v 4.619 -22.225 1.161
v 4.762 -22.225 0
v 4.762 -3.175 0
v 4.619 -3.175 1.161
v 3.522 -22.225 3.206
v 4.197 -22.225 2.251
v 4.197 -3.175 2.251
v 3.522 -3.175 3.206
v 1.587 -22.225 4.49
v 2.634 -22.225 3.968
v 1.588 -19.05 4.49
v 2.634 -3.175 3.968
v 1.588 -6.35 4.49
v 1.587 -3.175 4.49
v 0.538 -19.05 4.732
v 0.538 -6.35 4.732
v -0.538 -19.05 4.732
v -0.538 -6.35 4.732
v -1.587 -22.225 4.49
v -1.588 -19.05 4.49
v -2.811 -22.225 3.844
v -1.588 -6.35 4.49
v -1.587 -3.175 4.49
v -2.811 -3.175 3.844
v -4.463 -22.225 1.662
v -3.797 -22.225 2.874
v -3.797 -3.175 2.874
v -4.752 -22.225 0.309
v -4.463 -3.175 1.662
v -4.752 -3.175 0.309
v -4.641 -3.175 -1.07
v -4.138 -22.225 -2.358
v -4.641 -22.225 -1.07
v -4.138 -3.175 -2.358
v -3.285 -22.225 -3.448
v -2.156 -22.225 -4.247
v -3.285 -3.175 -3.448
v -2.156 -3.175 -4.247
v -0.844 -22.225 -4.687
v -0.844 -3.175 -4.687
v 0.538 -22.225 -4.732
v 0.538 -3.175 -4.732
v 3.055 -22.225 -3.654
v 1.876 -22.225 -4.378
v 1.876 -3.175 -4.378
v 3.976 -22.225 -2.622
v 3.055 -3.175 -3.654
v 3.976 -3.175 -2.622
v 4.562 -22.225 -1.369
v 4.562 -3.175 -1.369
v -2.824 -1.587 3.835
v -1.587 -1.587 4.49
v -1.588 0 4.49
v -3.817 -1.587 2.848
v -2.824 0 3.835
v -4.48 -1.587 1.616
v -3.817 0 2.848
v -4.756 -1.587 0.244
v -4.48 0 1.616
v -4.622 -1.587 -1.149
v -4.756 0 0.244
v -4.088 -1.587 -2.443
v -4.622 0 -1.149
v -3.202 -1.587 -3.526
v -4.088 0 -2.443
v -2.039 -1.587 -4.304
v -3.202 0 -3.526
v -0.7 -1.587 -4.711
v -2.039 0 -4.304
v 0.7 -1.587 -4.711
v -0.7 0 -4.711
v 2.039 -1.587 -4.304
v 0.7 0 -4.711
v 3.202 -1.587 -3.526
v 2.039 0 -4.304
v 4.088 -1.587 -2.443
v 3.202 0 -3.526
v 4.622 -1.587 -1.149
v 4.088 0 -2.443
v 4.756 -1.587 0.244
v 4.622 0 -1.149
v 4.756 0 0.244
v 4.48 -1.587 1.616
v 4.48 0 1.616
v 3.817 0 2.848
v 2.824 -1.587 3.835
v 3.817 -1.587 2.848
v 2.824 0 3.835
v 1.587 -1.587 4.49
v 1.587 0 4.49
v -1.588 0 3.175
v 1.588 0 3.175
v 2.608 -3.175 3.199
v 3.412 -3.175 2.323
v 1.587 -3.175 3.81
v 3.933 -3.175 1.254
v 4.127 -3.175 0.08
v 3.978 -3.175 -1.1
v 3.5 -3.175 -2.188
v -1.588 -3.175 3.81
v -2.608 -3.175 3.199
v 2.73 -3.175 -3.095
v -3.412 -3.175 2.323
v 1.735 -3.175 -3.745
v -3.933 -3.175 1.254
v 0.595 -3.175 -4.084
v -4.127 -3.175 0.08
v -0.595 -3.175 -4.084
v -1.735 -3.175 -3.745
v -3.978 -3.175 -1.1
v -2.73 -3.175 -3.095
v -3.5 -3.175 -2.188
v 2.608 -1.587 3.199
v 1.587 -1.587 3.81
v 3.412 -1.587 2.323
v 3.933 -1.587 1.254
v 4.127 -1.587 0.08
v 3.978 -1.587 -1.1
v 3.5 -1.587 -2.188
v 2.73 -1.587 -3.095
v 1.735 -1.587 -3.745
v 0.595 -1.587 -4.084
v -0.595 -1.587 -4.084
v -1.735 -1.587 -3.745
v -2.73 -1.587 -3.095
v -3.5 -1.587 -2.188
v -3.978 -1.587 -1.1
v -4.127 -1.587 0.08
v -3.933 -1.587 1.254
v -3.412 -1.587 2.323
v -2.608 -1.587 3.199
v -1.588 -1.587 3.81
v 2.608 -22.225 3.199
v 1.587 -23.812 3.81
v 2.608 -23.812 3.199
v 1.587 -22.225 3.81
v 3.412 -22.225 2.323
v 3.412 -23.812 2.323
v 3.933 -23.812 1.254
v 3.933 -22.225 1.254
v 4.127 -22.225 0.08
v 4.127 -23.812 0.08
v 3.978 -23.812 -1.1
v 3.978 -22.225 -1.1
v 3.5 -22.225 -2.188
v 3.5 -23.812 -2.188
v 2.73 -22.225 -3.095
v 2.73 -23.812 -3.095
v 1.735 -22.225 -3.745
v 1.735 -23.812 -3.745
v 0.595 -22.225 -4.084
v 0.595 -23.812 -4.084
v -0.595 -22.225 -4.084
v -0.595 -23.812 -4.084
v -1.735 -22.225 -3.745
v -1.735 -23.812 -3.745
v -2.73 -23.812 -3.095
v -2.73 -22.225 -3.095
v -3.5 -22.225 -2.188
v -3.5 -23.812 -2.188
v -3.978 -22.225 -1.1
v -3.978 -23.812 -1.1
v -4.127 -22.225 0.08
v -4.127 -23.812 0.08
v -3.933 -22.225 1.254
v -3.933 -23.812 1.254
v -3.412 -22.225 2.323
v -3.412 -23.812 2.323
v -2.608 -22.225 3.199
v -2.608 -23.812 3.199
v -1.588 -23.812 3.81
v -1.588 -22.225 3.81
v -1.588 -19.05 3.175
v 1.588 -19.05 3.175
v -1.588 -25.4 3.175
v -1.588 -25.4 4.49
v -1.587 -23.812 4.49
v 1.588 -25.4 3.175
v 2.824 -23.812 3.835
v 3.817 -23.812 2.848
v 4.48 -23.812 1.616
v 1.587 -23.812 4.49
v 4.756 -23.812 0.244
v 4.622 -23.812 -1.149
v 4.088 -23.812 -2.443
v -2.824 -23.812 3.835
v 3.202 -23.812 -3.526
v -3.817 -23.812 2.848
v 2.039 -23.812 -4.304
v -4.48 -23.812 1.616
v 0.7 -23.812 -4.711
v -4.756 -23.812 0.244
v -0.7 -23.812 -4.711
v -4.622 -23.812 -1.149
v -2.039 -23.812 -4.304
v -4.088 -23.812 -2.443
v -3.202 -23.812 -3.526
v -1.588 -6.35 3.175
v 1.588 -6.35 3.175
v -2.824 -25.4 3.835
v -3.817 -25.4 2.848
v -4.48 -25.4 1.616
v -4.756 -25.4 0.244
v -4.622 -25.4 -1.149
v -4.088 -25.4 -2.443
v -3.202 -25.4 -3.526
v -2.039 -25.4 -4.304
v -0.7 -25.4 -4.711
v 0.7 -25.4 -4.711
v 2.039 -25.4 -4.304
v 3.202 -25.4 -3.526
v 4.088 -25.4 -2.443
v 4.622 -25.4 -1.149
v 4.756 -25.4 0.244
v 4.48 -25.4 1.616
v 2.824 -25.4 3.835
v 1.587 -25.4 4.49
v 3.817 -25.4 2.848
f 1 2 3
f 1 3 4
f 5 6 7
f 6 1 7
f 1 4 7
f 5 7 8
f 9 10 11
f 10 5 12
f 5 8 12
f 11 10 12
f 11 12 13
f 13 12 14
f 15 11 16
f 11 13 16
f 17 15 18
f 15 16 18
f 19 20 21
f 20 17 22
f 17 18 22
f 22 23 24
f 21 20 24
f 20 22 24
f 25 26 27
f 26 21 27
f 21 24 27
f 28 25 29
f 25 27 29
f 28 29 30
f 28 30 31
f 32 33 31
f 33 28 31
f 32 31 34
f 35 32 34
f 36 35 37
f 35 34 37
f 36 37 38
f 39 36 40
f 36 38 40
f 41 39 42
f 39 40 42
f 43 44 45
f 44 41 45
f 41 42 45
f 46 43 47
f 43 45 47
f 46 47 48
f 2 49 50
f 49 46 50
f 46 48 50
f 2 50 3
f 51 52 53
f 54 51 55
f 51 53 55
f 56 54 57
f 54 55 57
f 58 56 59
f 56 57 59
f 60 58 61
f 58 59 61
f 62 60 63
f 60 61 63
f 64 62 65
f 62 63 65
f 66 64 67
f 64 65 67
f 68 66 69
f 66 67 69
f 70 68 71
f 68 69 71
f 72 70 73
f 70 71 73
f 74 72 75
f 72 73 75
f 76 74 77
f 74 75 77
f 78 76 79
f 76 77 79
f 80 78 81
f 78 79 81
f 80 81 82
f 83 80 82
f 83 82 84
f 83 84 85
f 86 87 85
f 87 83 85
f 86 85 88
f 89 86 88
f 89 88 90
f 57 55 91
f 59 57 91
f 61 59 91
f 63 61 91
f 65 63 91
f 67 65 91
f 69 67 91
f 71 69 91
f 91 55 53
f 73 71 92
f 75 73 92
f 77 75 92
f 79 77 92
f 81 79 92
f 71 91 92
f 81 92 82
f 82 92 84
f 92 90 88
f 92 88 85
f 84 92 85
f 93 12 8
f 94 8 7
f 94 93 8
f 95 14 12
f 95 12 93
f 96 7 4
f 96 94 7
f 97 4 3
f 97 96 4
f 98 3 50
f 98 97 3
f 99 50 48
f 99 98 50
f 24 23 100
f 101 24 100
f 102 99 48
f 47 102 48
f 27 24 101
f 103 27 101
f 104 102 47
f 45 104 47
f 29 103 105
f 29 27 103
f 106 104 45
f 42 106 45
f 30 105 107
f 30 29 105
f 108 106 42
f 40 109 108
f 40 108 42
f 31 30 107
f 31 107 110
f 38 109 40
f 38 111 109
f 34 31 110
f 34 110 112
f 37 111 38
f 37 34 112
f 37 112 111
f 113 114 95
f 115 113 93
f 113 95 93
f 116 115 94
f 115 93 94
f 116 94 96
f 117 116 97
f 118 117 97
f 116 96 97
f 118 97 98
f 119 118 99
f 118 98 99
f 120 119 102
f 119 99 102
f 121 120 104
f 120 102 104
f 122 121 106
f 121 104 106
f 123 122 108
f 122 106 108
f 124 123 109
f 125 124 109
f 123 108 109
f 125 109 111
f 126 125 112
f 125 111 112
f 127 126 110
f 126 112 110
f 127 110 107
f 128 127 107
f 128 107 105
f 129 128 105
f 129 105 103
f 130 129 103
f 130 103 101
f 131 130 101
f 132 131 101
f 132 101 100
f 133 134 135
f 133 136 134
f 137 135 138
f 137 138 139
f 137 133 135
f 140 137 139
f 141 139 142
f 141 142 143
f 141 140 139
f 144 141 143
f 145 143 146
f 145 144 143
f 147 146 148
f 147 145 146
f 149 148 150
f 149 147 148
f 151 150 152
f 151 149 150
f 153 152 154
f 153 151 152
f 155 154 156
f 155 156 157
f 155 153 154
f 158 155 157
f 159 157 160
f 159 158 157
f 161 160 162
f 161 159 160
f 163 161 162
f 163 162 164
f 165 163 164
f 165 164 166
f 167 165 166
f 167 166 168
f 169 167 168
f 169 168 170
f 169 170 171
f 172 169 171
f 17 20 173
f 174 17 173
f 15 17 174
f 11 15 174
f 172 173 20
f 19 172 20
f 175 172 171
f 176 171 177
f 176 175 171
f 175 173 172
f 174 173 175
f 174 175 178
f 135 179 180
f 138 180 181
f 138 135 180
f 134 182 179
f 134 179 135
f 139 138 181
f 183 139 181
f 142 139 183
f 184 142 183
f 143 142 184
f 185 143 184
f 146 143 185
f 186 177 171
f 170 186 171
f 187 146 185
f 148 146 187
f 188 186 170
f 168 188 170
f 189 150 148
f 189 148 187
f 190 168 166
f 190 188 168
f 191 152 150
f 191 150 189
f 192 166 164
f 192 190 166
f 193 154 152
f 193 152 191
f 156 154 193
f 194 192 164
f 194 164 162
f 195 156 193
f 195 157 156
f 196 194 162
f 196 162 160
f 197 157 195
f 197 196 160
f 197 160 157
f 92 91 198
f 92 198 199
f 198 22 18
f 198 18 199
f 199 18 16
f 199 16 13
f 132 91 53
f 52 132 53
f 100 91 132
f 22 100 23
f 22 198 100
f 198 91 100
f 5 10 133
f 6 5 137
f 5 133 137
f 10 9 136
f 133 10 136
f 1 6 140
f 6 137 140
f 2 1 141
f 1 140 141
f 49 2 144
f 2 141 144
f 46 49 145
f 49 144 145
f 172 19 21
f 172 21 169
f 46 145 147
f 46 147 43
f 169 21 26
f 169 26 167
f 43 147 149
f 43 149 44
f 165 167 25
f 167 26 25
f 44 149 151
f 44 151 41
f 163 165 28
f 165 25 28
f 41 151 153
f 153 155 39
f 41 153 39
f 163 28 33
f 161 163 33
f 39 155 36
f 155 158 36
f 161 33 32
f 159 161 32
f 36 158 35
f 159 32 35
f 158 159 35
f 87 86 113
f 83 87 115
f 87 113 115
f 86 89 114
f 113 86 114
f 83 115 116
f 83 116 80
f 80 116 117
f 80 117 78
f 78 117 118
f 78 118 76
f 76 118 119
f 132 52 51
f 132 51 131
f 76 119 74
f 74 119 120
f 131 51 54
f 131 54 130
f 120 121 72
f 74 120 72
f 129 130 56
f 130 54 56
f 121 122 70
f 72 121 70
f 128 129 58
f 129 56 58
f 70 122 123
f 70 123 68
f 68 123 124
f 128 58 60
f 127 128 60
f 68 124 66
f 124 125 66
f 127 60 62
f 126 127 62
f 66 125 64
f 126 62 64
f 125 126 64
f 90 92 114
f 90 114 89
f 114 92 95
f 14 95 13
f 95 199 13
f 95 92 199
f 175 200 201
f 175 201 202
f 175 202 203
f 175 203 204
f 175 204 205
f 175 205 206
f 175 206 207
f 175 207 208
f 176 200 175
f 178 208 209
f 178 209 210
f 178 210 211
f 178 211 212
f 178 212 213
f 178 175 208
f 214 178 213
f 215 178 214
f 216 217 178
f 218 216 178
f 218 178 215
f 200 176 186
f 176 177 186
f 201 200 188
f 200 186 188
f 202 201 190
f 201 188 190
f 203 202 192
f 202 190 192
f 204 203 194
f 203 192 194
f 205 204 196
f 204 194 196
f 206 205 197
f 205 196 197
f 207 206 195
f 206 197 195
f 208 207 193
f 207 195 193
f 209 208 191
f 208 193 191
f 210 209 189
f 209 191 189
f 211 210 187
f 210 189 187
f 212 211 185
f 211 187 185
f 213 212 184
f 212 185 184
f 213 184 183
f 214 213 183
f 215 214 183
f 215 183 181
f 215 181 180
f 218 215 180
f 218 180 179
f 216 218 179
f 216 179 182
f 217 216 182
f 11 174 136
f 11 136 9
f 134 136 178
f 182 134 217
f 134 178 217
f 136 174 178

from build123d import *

# Parameters (mm, degrees)
F0_R            = 4.7625
F1_DEPTH        = 25.4
F2_W            = 3.175
F2_H            = 3.175
F3_DEPTH        = 6.35
F3_COPIES_COUNT = 2
F3_COPIES_PITCH = 19.05
F5_W            = 1.5875
F5_H            = 0.635


# Not quite as in the source:
# - a pattern or mirror of a feature is missing from the dataset's text; its kind, count and spacing are read off the source's solid


with BuildPart() as f1:
    # F0 (on Front) → F1 (new body)
    with BuildSketch(Plane.XZ):
        Circle(F0_R)
    extrude(amount=F1_DEPTH)

    # F2 (on face) → F3 (cut)
    with BuildSketch(Plane.XZ.offset(25.4)):
        with Locations((0, 4.7625)):
            Rectangle(F2_W, F2_H)
    f3 = extrude(amount=-F3_DEPTH, mode=Mode.SUBTRACT)

    # F3_copies: F3 ×2
    with Locations(*[(0, i * F3_COPIES_PITCH, 0) for i in range(1, F3_COPIES_COUNT)]):
        add(f3, mode=Mode.SUBTRACT)

    # F5 (on Right) → F6 (revolve, cut)
    with BuildSketch(Plane.YZ):
        with Locations((-23.01875, -4.445)):
            Rectangle(F5_W, F5_H)
    f6 = revolve(axis=Axis((0, -12.6913171262, 0), (0, 1, 0)), mode=Mode.SUBTRACT)

    # F6_copies: F6 across plane
    add(f6.mirror(Plane.ZX.offset(-12.7)), mode=Mode.SUBTRACT)


solid = f1.part
